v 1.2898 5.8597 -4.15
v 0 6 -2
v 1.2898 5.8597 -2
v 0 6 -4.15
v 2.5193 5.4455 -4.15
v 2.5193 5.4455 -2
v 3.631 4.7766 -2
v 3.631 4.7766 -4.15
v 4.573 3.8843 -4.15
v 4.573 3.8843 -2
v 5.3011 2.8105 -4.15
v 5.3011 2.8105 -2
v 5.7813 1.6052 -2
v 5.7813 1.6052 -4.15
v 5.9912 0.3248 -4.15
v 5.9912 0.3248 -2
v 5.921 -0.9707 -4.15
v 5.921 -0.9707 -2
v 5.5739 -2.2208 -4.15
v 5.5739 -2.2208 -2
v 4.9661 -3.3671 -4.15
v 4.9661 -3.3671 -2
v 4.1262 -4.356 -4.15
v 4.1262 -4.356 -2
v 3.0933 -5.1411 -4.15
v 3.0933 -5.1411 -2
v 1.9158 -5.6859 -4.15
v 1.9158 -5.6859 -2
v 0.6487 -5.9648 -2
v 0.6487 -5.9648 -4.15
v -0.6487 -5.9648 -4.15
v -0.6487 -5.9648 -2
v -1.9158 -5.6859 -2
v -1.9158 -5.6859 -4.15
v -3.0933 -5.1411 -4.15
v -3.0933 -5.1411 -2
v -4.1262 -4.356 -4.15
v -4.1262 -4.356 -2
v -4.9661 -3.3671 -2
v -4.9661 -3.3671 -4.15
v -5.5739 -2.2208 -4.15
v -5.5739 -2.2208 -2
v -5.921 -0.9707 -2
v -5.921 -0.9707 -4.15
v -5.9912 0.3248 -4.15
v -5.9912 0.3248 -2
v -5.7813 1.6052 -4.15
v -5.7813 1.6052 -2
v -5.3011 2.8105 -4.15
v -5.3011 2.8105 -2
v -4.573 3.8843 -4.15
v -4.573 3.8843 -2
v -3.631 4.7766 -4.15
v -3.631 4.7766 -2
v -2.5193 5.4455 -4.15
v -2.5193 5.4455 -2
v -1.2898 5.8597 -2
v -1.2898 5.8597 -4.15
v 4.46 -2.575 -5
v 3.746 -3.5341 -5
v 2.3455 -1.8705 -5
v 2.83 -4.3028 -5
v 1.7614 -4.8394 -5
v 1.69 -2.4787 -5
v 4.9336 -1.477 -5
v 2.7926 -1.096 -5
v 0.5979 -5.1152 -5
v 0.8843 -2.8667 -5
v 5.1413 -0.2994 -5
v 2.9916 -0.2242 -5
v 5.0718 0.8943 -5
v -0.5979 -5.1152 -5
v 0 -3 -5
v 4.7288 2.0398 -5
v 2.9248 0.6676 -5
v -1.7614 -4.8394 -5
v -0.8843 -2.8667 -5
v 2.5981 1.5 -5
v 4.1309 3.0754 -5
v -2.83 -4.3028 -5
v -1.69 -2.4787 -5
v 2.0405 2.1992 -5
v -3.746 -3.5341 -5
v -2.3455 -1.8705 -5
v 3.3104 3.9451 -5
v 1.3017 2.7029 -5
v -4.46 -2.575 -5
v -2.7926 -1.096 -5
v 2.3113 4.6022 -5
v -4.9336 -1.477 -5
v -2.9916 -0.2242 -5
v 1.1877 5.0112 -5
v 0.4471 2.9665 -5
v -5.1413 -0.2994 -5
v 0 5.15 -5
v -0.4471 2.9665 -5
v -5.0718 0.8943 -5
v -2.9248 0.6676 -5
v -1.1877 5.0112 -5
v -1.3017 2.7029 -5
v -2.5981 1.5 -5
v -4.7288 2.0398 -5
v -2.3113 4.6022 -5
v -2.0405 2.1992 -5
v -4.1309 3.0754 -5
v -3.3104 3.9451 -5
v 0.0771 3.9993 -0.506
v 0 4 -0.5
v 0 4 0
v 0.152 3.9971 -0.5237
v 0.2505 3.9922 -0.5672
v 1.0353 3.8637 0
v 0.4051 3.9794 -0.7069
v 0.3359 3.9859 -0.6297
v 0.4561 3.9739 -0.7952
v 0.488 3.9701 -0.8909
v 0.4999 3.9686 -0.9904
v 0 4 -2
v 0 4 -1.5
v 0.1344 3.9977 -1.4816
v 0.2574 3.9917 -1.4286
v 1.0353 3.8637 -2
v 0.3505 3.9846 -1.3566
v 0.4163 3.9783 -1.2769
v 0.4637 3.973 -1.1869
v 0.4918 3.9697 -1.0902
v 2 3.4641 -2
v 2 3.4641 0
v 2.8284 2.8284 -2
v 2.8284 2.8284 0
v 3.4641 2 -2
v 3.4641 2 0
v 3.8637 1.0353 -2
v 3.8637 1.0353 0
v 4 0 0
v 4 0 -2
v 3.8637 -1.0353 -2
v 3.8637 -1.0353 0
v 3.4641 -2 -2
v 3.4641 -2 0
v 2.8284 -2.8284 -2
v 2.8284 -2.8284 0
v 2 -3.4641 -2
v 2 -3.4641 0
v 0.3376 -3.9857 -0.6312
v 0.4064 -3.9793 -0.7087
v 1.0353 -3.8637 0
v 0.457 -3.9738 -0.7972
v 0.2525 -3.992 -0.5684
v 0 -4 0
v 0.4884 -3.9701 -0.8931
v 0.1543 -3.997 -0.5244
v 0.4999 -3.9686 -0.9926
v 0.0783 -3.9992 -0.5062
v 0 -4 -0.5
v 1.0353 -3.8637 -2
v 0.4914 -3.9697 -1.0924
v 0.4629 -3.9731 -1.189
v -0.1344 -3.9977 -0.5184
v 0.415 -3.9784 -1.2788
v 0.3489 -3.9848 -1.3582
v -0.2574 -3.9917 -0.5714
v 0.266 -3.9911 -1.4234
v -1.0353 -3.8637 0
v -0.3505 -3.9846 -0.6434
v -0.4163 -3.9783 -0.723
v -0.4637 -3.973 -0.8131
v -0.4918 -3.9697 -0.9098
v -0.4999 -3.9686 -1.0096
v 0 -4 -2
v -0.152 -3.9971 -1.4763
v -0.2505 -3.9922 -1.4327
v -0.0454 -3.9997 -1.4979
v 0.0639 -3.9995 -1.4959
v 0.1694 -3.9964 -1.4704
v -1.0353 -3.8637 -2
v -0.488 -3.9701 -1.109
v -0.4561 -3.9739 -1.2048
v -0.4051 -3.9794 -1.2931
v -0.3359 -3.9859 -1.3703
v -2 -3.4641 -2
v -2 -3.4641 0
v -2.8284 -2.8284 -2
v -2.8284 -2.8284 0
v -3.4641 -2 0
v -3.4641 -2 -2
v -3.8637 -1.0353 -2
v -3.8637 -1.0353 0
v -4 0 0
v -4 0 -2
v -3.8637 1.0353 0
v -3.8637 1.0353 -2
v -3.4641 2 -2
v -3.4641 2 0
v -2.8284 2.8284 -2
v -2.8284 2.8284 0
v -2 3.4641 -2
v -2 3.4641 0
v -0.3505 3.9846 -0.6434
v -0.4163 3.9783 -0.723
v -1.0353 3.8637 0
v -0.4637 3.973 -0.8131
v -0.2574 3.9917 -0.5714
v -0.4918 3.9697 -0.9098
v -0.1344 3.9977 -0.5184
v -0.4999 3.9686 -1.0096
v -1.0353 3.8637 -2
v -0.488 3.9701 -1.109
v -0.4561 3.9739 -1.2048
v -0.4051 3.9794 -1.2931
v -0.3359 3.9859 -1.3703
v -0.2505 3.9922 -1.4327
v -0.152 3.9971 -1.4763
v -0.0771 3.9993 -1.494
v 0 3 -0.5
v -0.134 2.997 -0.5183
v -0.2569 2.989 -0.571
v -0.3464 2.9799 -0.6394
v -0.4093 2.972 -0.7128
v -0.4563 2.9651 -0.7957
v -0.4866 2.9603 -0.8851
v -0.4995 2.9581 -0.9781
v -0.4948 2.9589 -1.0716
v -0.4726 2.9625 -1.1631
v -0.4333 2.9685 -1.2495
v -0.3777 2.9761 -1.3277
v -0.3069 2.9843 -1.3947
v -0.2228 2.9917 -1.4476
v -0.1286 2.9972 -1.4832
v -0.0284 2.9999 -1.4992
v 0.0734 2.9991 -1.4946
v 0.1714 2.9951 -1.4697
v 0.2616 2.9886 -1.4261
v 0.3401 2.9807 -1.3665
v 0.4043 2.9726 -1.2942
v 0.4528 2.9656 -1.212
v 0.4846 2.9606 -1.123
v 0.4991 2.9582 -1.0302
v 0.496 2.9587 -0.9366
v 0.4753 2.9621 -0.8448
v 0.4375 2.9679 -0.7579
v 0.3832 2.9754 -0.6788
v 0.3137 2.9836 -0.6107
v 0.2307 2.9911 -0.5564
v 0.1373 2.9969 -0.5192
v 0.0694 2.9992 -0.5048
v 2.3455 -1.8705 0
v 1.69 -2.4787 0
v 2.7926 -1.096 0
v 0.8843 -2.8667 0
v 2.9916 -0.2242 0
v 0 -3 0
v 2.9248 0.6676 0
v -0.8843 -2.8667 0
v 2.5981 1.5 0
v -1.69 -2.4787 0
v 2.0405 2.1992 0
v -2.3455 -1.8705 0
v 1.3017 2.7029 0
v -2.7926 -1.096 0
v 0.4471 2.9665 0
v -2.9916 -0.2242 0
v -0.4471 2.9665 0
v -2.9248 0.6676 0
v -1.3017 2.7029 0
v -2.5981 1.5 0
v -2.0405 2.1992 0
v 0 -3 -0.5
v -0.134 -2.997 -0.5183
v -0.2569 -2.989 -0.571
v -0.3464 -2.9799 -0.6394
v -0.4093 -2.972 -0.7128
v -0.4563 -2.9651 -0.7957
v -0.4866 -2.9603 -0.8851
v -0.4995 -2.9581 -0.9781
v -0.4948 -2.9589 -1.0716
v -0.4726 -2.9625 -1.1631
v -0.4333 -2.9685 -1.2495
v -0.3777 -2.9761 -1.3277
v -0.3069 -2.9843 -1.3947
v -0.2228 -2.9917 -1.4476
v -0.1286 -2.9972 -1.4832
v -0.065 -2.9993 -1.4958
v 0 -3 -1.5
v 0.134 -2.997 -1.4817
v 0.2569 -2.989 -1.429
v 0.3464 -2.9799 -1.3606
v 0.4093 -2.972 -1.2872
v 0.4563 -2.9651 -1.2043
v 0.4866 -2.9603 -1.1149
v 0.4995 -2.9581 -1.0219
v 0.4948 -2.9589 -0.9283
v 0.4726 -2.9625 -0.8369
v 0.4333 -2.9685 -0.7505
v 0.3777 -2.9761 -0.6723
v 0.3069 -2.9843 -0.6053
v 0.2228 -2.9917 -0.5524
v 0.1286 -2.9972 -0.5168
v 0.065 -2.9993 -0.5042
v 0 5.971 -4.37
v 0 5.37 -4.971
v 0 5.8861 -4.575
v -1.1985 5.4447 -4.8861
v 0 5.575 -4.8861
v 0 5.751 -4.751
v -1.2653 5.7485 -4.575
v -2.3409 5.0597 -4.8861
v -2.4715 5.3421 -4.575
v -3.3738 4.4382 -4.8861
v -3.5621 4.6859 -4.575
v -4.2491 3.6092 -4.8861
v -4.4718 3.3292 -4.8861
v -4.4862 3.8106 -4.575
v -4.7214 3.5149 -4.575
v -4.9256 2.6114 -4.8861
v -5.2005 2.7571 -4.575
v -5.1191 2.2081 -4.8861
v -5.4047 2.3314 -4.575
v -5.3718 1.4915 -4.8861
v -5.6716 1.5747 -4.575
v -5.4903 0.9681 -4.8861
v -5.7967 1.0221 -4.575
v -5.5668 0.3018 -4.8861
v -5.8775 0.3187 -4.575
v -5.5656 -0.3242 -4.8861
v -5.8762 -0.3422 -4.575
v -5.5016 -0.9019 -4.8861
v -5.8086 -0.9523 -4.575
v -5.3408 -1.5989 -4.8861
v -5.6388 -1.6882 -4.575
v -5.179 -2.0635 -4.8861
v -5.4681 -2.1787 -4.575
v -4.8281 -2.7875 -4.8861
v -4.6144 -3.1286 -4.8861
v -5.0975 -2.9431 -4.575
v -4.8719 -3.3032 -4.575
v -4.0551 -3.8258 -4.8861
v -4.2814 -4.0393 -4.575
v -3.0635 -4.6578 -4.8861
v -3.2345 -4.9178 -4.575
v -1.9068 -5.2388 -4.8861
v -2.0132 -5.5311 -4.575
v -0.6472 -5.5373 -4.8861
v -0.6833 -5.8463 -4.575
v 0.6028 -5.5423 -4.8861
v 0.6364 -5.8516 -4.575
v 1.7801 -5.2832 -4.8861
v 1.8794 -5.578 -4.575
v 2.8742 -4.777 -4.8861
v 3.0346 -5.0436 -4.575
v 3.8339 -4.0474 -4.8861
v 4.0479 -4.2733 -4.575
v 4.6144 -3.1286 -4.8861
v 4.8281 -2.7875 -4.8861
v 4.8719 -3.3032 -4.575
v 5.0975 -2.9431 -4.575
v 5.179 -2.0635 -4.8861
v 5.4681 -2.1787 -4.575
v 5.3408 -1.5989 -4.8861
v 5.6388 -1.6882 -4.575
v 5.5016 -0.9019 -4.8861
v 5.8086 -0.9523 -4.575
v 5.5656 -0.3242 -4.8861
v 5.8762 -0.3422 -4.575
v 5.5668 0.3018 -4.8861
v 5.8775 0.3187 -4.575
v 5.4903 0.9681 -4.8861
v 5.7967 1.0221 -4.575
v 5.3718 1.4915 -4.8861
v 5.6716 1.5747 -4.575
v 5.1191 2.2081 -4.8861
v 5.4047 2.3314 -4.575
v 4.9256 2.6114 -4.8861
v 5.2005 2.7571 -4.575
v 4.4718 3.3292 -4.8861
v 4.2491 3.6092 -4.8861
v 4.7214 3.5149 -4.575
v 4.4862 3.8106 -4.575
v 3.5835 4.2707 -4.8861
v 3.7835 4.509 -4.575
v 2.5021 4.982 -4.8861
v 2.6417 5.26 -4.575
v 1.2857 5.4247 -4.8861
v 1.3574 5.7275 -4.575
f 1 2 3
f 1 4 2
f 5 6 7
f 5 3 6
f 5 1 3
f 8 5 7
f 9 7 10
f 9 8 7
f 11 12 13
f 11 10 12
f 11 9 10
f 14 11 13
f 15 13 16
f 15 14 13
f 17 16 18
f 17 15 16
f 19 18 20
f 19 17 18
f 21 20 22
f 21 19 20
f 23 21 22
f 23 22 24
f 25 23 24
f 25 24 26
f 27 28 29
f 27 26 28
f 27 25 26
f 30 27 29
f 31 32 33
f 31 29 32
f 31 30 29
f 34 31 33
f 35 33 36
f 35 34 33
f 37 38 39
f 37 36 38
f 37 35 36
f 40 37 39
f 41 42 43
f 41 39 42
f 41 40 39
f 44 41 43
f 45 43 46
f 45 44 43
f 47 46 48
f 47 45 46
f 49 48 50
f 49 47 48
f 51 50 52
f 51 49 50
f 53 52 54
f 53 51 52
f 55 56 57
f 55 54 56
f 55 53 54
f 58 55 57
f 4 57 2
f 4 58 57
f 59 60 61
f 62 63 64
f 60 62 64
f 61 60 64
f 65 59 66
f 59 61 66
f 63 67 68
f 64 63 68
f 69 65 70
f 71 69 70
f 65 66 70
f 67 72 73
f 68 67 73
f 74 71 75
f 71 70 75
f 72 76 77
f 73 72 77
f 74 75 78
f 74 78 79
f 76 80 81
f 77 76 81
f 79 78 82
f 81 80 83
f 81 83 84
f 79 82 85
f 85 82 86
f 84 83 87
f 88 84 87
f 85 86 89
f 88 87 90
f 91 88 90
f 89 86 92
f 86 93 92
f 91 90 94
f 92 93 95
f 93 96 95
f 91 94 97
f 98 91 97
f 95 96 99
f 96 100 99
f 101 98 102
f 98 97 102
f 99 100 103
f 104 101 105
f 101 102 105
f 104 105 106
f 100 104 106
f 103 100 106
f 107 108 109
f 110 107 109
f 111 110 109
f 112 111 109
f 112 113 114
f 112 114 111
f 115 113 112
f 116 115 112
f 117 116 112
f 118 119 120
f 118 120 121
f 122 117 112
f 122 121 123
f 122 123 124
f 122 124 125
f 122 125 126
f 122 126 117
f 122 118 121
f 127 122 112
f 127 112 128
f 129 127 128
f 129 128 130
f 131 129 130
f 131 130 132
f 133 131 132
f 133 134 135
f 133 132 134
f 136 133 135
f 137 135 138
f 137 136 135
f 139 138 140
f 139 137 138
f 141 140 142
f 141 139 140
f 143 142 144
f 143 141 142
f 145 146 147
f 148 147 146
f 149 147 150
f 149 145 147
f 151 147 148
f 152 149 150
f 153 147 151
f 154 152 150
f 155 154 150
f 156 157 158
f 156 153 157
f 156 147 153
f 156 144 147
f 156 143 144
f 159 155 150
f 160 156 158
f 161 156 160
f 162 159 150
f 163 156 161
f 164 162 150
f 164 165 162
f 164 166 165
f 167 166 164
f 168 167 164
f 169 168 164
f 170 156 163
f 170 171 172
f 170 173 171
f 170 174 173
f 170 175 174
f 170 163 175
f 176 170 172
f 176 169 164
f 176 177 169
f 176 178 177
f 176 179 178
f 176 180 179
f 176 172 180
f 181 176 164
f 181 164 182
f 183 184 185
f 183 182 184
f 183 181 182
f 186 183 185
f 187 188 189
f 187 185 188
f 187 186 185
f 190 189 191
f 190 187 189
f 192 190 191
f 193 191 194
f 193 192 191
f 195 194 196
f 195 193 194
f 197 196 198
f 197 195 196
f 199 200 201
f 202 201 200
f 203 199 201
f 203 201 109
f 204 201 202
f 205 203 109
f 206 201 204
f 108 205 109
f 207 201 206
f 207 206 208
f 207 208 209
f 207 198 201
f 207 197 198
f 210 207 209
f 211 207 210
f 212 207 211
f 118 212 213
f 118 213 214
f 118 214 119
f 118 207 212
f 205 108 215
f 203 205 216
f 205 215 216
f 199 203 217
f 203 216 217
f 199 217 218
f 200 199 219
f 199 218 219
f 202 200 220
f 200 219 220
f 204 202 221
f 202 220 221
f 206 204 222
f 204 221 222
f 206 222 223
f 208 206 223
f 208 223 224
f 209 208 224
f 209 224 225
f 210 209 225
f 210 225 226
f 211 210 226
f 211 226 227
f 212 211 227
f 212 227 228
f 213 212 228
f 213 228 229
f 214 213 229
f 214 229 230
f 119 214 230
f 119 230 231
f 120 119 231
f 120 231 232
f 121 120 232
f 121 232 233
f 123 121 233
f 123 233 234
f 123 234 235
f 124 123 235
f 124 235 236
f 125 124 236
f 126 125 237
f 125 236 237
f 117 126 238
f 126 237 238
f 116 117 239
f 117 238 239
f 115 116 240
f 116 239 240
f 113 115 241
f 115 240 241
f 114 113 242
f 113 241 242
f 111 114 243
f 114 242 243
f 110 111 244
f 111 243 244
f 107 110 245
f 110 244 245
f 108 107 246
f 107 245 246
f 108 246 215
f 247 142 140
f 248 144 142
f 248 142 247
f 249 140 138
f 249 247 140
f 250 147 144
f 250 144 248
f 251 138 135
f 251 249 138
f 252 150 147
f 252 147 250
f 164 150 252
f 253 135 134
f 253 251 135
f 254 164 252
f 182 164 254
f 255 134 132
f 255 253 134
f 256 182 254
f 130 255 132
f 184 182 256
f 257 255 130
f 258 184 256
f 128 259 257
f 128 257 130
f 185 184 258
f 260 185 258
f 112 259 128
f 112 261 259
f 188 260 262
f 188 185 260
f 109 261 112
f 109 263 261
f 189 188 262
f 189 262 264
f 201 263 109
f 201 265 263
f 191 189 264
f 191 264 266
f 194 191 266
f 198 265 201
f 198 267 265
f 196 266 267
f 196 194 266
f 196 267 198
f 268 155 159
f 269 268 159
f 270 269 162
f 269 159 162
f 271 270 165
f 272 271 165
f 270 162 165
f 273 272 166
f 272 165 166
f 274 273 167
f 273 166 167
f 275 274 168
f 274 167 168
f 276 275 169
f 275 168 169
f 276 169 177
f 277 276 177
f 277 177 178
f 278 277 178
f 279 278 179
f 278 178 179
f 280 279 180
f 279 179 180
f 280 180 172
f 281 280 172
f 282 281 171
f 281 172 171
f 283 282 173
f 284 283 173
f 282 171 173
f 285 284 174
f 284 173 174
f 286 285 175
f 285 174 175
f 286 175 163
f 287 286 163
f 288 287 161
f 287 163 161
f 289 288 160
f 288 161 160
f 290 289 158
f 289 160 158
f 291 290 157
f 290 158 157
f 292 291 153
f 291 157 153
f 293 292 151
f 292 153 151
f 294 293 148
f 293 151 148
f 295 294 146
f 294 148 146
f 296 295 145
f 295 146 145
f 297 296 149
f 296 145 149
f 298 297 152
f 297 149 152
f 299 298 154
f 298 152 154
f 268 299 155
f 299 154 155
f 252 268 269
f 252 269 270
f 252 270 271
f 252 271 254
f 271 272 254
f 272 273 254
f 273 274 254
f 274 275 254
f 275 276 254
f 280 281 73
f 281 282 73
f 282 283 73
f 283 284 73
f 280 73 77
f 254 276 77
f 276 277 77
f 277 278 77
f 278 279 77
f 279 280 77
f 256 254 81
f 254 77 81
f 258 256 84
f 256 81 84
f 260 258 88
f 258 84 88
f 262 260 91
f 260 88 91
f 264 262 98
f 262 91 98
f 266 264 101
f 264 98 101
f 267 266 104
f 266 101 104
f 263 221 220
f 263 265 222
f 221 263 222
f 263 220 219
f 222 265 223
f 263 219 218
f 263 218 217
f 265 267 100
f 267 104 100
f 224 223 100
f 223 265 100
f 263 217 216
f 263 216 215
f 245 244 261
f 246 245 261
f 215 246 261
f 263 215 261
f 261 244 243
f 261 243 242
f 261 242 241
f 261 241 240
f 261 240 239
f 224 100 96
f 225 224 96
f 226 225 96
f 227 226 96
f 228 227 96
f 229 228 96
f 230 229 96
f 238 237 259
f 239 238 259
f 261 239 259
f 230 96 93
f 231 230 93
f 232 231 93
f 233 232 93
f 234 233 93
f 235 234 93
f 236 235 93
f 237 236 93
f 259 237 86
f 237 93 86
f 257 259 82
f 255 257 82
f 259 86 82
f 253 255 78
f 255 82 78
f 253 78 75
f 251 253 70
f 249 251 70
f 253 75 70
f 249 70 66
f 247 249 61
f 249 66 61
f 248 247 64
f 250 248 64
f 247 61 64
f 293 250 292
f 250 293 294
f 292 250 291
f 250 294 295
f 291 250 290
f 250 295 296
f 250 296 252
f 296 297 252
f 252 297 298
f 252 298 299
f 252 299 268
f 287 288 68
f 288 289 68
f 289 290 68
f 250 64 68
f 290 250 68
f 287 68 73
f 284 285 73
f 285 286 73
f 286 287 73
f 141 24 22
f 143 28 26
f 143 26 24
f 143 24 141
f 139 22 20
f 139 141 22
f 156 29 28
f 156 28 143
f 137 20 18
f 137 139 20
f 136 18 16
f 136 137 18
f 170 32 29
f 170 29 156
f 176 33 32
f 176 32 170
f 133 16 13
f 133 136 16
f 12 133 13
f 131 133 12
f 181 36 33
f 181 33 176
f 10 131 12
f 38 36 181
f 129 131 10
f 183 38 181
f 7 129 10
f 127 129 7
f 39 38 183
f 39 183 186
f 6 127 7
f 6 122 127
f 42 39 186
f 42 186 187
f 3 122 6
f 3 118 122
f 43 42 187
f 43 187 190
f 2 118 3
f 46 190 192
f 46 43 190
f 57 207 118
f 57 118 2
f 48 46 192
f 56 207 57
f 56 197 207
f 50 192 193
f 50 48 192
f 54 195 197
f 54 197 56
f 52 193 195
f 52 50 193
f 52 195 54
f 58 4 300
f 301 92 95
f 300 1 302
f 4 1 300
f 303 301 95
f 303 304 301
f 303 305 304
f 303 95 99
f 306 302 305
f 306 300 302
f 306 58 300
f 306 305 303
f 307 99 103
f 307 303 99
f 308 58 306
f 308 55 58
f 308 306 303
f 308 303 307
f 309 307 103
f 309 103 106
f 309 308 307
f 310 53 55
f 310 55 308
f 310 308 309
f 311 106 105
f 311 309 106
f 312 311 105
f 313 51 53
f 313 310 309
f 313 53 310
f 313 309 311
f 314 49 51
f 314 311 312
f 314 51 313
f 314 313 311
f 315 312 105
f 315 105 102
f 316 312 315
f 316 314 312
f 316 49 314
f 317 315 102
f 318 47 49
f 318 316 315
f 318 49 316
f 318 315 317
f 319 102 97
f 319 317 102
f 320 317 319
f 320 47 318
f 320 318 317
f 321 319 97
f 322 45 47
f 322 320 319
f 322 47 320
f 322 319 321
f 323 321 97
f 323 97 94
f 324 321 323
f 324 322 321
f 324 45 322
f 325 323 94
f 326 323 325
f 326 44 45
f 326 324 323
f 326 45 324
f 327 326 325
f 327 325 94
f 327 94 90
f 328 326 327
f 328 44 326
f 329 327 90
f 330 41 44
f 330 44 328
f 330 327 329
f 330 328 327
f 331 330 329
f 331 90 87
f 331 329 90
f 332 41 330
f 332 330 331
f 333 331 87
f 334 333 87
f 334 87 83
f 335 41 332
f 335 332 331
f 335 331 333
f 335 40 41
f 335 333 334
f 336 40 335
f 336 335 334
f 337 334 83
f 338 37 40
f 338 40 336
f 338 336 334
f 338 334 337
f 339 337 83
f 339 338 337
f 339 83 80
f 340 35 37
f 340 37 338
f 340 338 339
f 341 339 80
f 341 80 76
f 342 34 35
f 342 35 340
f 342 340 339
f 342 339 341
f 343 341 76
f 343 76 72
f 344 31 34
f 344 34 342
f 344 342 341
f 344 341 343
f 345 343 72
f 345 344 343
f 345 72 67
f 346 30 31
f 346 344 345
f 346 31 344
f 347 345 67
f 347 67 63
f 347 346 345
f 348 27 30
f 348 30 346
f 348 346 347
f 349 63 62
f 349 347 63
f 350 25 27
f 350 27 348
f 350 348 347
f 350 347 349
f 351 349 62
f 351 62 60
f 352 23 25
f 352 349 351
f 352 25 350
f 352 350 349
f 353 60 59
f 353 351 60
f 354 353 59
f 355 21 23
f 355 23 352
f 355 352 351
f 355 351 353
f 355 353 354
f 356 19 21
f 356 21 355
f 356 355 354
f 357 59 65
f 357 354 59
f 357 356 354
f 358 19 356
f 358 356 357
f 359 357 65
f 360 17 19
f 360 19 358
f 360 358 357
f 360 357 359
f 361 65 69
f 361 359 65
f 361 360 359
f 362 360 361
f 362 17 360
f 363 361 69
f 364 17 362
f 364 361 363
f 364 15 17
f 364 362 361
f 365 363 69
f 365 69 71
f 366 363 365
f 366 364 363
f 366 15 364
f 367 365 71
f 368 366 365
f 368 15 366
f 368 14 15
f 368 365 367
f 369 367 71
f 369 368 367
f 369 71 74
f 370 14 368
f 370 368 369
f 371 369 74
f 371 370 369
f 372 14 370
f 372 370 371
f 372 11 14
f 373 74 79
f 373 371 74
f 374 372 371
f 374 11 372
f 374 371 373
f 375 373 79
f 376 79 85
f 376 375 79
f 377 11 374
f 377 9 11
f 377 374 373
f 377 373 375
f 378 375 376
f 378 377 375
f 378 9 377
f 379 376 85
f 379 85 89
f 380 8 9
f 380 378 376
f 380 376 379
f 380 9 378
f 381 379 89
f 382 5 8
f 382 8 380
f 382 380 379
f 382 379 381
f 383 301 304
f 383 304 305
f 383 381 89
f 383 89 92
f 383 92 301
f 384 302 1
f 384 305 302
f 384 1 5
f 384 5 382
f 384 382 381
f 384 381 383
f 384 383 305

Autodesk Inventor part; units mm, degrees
ref_plane "YZ Plane" through (0, 0, 0) normal (1, 0, 0) x (0, 1, 0)
ref_plane "XY Plane" through (0, 0, 0) normal (0, 0, 1) x (1, 0, 0)
sketch "Sketch1" plane through (0, 0, 0) normal (1, 0, 0) x (0, 1, 0)
  line L0 (0, 0) -> (4, 0)
  line L1 (4, 0) -> (4, -2)
  line L2 (4, -2) -> (6, -2)
  line L3 (6, -2) -> (6, -5)
  line L4 (6, -5) -> (0, -5)
  line L5 (0, -5) -> (0, 0)
  point P0 (3, -5)
  dimension "d0" = 5
  dimension "d1" = 2
  dimension "d2" = 8
  dimension "d3" = 12
revolve "Revolution1" add sketch "Sketch1" angle 360 about axis through (0, 0, -5) along (0, 0, 1)
sketch "Sketch2" plane through (0, 0, 0) normal (0, 0, 1) x (1, 0, 0)
  circle A0 centre (0, 0) radius 4 projected
hole "Hole1" at (0, 0, 0) direction (0, 0, -1) diameter 6 depth 5
fillet "Fillet1" radius 0.85 1 edges at (0, -6, -5)
ref_plane "Work Plane1" through (0, 4, 0) normal (0, 1, 0) x (-1, 0, 0)
sketch "Sketch3" plane through (0, 4, 0) normal (0, 1, 0) x (-1, 0, 0)
  point P0 (0, 0)
  point P1 (0, -1)
  dimension "d14" = 1
hole "Hole2" at (0, 4, -1) direction (0, -1, 0) diameter 1 end through all
properties part number "03"
